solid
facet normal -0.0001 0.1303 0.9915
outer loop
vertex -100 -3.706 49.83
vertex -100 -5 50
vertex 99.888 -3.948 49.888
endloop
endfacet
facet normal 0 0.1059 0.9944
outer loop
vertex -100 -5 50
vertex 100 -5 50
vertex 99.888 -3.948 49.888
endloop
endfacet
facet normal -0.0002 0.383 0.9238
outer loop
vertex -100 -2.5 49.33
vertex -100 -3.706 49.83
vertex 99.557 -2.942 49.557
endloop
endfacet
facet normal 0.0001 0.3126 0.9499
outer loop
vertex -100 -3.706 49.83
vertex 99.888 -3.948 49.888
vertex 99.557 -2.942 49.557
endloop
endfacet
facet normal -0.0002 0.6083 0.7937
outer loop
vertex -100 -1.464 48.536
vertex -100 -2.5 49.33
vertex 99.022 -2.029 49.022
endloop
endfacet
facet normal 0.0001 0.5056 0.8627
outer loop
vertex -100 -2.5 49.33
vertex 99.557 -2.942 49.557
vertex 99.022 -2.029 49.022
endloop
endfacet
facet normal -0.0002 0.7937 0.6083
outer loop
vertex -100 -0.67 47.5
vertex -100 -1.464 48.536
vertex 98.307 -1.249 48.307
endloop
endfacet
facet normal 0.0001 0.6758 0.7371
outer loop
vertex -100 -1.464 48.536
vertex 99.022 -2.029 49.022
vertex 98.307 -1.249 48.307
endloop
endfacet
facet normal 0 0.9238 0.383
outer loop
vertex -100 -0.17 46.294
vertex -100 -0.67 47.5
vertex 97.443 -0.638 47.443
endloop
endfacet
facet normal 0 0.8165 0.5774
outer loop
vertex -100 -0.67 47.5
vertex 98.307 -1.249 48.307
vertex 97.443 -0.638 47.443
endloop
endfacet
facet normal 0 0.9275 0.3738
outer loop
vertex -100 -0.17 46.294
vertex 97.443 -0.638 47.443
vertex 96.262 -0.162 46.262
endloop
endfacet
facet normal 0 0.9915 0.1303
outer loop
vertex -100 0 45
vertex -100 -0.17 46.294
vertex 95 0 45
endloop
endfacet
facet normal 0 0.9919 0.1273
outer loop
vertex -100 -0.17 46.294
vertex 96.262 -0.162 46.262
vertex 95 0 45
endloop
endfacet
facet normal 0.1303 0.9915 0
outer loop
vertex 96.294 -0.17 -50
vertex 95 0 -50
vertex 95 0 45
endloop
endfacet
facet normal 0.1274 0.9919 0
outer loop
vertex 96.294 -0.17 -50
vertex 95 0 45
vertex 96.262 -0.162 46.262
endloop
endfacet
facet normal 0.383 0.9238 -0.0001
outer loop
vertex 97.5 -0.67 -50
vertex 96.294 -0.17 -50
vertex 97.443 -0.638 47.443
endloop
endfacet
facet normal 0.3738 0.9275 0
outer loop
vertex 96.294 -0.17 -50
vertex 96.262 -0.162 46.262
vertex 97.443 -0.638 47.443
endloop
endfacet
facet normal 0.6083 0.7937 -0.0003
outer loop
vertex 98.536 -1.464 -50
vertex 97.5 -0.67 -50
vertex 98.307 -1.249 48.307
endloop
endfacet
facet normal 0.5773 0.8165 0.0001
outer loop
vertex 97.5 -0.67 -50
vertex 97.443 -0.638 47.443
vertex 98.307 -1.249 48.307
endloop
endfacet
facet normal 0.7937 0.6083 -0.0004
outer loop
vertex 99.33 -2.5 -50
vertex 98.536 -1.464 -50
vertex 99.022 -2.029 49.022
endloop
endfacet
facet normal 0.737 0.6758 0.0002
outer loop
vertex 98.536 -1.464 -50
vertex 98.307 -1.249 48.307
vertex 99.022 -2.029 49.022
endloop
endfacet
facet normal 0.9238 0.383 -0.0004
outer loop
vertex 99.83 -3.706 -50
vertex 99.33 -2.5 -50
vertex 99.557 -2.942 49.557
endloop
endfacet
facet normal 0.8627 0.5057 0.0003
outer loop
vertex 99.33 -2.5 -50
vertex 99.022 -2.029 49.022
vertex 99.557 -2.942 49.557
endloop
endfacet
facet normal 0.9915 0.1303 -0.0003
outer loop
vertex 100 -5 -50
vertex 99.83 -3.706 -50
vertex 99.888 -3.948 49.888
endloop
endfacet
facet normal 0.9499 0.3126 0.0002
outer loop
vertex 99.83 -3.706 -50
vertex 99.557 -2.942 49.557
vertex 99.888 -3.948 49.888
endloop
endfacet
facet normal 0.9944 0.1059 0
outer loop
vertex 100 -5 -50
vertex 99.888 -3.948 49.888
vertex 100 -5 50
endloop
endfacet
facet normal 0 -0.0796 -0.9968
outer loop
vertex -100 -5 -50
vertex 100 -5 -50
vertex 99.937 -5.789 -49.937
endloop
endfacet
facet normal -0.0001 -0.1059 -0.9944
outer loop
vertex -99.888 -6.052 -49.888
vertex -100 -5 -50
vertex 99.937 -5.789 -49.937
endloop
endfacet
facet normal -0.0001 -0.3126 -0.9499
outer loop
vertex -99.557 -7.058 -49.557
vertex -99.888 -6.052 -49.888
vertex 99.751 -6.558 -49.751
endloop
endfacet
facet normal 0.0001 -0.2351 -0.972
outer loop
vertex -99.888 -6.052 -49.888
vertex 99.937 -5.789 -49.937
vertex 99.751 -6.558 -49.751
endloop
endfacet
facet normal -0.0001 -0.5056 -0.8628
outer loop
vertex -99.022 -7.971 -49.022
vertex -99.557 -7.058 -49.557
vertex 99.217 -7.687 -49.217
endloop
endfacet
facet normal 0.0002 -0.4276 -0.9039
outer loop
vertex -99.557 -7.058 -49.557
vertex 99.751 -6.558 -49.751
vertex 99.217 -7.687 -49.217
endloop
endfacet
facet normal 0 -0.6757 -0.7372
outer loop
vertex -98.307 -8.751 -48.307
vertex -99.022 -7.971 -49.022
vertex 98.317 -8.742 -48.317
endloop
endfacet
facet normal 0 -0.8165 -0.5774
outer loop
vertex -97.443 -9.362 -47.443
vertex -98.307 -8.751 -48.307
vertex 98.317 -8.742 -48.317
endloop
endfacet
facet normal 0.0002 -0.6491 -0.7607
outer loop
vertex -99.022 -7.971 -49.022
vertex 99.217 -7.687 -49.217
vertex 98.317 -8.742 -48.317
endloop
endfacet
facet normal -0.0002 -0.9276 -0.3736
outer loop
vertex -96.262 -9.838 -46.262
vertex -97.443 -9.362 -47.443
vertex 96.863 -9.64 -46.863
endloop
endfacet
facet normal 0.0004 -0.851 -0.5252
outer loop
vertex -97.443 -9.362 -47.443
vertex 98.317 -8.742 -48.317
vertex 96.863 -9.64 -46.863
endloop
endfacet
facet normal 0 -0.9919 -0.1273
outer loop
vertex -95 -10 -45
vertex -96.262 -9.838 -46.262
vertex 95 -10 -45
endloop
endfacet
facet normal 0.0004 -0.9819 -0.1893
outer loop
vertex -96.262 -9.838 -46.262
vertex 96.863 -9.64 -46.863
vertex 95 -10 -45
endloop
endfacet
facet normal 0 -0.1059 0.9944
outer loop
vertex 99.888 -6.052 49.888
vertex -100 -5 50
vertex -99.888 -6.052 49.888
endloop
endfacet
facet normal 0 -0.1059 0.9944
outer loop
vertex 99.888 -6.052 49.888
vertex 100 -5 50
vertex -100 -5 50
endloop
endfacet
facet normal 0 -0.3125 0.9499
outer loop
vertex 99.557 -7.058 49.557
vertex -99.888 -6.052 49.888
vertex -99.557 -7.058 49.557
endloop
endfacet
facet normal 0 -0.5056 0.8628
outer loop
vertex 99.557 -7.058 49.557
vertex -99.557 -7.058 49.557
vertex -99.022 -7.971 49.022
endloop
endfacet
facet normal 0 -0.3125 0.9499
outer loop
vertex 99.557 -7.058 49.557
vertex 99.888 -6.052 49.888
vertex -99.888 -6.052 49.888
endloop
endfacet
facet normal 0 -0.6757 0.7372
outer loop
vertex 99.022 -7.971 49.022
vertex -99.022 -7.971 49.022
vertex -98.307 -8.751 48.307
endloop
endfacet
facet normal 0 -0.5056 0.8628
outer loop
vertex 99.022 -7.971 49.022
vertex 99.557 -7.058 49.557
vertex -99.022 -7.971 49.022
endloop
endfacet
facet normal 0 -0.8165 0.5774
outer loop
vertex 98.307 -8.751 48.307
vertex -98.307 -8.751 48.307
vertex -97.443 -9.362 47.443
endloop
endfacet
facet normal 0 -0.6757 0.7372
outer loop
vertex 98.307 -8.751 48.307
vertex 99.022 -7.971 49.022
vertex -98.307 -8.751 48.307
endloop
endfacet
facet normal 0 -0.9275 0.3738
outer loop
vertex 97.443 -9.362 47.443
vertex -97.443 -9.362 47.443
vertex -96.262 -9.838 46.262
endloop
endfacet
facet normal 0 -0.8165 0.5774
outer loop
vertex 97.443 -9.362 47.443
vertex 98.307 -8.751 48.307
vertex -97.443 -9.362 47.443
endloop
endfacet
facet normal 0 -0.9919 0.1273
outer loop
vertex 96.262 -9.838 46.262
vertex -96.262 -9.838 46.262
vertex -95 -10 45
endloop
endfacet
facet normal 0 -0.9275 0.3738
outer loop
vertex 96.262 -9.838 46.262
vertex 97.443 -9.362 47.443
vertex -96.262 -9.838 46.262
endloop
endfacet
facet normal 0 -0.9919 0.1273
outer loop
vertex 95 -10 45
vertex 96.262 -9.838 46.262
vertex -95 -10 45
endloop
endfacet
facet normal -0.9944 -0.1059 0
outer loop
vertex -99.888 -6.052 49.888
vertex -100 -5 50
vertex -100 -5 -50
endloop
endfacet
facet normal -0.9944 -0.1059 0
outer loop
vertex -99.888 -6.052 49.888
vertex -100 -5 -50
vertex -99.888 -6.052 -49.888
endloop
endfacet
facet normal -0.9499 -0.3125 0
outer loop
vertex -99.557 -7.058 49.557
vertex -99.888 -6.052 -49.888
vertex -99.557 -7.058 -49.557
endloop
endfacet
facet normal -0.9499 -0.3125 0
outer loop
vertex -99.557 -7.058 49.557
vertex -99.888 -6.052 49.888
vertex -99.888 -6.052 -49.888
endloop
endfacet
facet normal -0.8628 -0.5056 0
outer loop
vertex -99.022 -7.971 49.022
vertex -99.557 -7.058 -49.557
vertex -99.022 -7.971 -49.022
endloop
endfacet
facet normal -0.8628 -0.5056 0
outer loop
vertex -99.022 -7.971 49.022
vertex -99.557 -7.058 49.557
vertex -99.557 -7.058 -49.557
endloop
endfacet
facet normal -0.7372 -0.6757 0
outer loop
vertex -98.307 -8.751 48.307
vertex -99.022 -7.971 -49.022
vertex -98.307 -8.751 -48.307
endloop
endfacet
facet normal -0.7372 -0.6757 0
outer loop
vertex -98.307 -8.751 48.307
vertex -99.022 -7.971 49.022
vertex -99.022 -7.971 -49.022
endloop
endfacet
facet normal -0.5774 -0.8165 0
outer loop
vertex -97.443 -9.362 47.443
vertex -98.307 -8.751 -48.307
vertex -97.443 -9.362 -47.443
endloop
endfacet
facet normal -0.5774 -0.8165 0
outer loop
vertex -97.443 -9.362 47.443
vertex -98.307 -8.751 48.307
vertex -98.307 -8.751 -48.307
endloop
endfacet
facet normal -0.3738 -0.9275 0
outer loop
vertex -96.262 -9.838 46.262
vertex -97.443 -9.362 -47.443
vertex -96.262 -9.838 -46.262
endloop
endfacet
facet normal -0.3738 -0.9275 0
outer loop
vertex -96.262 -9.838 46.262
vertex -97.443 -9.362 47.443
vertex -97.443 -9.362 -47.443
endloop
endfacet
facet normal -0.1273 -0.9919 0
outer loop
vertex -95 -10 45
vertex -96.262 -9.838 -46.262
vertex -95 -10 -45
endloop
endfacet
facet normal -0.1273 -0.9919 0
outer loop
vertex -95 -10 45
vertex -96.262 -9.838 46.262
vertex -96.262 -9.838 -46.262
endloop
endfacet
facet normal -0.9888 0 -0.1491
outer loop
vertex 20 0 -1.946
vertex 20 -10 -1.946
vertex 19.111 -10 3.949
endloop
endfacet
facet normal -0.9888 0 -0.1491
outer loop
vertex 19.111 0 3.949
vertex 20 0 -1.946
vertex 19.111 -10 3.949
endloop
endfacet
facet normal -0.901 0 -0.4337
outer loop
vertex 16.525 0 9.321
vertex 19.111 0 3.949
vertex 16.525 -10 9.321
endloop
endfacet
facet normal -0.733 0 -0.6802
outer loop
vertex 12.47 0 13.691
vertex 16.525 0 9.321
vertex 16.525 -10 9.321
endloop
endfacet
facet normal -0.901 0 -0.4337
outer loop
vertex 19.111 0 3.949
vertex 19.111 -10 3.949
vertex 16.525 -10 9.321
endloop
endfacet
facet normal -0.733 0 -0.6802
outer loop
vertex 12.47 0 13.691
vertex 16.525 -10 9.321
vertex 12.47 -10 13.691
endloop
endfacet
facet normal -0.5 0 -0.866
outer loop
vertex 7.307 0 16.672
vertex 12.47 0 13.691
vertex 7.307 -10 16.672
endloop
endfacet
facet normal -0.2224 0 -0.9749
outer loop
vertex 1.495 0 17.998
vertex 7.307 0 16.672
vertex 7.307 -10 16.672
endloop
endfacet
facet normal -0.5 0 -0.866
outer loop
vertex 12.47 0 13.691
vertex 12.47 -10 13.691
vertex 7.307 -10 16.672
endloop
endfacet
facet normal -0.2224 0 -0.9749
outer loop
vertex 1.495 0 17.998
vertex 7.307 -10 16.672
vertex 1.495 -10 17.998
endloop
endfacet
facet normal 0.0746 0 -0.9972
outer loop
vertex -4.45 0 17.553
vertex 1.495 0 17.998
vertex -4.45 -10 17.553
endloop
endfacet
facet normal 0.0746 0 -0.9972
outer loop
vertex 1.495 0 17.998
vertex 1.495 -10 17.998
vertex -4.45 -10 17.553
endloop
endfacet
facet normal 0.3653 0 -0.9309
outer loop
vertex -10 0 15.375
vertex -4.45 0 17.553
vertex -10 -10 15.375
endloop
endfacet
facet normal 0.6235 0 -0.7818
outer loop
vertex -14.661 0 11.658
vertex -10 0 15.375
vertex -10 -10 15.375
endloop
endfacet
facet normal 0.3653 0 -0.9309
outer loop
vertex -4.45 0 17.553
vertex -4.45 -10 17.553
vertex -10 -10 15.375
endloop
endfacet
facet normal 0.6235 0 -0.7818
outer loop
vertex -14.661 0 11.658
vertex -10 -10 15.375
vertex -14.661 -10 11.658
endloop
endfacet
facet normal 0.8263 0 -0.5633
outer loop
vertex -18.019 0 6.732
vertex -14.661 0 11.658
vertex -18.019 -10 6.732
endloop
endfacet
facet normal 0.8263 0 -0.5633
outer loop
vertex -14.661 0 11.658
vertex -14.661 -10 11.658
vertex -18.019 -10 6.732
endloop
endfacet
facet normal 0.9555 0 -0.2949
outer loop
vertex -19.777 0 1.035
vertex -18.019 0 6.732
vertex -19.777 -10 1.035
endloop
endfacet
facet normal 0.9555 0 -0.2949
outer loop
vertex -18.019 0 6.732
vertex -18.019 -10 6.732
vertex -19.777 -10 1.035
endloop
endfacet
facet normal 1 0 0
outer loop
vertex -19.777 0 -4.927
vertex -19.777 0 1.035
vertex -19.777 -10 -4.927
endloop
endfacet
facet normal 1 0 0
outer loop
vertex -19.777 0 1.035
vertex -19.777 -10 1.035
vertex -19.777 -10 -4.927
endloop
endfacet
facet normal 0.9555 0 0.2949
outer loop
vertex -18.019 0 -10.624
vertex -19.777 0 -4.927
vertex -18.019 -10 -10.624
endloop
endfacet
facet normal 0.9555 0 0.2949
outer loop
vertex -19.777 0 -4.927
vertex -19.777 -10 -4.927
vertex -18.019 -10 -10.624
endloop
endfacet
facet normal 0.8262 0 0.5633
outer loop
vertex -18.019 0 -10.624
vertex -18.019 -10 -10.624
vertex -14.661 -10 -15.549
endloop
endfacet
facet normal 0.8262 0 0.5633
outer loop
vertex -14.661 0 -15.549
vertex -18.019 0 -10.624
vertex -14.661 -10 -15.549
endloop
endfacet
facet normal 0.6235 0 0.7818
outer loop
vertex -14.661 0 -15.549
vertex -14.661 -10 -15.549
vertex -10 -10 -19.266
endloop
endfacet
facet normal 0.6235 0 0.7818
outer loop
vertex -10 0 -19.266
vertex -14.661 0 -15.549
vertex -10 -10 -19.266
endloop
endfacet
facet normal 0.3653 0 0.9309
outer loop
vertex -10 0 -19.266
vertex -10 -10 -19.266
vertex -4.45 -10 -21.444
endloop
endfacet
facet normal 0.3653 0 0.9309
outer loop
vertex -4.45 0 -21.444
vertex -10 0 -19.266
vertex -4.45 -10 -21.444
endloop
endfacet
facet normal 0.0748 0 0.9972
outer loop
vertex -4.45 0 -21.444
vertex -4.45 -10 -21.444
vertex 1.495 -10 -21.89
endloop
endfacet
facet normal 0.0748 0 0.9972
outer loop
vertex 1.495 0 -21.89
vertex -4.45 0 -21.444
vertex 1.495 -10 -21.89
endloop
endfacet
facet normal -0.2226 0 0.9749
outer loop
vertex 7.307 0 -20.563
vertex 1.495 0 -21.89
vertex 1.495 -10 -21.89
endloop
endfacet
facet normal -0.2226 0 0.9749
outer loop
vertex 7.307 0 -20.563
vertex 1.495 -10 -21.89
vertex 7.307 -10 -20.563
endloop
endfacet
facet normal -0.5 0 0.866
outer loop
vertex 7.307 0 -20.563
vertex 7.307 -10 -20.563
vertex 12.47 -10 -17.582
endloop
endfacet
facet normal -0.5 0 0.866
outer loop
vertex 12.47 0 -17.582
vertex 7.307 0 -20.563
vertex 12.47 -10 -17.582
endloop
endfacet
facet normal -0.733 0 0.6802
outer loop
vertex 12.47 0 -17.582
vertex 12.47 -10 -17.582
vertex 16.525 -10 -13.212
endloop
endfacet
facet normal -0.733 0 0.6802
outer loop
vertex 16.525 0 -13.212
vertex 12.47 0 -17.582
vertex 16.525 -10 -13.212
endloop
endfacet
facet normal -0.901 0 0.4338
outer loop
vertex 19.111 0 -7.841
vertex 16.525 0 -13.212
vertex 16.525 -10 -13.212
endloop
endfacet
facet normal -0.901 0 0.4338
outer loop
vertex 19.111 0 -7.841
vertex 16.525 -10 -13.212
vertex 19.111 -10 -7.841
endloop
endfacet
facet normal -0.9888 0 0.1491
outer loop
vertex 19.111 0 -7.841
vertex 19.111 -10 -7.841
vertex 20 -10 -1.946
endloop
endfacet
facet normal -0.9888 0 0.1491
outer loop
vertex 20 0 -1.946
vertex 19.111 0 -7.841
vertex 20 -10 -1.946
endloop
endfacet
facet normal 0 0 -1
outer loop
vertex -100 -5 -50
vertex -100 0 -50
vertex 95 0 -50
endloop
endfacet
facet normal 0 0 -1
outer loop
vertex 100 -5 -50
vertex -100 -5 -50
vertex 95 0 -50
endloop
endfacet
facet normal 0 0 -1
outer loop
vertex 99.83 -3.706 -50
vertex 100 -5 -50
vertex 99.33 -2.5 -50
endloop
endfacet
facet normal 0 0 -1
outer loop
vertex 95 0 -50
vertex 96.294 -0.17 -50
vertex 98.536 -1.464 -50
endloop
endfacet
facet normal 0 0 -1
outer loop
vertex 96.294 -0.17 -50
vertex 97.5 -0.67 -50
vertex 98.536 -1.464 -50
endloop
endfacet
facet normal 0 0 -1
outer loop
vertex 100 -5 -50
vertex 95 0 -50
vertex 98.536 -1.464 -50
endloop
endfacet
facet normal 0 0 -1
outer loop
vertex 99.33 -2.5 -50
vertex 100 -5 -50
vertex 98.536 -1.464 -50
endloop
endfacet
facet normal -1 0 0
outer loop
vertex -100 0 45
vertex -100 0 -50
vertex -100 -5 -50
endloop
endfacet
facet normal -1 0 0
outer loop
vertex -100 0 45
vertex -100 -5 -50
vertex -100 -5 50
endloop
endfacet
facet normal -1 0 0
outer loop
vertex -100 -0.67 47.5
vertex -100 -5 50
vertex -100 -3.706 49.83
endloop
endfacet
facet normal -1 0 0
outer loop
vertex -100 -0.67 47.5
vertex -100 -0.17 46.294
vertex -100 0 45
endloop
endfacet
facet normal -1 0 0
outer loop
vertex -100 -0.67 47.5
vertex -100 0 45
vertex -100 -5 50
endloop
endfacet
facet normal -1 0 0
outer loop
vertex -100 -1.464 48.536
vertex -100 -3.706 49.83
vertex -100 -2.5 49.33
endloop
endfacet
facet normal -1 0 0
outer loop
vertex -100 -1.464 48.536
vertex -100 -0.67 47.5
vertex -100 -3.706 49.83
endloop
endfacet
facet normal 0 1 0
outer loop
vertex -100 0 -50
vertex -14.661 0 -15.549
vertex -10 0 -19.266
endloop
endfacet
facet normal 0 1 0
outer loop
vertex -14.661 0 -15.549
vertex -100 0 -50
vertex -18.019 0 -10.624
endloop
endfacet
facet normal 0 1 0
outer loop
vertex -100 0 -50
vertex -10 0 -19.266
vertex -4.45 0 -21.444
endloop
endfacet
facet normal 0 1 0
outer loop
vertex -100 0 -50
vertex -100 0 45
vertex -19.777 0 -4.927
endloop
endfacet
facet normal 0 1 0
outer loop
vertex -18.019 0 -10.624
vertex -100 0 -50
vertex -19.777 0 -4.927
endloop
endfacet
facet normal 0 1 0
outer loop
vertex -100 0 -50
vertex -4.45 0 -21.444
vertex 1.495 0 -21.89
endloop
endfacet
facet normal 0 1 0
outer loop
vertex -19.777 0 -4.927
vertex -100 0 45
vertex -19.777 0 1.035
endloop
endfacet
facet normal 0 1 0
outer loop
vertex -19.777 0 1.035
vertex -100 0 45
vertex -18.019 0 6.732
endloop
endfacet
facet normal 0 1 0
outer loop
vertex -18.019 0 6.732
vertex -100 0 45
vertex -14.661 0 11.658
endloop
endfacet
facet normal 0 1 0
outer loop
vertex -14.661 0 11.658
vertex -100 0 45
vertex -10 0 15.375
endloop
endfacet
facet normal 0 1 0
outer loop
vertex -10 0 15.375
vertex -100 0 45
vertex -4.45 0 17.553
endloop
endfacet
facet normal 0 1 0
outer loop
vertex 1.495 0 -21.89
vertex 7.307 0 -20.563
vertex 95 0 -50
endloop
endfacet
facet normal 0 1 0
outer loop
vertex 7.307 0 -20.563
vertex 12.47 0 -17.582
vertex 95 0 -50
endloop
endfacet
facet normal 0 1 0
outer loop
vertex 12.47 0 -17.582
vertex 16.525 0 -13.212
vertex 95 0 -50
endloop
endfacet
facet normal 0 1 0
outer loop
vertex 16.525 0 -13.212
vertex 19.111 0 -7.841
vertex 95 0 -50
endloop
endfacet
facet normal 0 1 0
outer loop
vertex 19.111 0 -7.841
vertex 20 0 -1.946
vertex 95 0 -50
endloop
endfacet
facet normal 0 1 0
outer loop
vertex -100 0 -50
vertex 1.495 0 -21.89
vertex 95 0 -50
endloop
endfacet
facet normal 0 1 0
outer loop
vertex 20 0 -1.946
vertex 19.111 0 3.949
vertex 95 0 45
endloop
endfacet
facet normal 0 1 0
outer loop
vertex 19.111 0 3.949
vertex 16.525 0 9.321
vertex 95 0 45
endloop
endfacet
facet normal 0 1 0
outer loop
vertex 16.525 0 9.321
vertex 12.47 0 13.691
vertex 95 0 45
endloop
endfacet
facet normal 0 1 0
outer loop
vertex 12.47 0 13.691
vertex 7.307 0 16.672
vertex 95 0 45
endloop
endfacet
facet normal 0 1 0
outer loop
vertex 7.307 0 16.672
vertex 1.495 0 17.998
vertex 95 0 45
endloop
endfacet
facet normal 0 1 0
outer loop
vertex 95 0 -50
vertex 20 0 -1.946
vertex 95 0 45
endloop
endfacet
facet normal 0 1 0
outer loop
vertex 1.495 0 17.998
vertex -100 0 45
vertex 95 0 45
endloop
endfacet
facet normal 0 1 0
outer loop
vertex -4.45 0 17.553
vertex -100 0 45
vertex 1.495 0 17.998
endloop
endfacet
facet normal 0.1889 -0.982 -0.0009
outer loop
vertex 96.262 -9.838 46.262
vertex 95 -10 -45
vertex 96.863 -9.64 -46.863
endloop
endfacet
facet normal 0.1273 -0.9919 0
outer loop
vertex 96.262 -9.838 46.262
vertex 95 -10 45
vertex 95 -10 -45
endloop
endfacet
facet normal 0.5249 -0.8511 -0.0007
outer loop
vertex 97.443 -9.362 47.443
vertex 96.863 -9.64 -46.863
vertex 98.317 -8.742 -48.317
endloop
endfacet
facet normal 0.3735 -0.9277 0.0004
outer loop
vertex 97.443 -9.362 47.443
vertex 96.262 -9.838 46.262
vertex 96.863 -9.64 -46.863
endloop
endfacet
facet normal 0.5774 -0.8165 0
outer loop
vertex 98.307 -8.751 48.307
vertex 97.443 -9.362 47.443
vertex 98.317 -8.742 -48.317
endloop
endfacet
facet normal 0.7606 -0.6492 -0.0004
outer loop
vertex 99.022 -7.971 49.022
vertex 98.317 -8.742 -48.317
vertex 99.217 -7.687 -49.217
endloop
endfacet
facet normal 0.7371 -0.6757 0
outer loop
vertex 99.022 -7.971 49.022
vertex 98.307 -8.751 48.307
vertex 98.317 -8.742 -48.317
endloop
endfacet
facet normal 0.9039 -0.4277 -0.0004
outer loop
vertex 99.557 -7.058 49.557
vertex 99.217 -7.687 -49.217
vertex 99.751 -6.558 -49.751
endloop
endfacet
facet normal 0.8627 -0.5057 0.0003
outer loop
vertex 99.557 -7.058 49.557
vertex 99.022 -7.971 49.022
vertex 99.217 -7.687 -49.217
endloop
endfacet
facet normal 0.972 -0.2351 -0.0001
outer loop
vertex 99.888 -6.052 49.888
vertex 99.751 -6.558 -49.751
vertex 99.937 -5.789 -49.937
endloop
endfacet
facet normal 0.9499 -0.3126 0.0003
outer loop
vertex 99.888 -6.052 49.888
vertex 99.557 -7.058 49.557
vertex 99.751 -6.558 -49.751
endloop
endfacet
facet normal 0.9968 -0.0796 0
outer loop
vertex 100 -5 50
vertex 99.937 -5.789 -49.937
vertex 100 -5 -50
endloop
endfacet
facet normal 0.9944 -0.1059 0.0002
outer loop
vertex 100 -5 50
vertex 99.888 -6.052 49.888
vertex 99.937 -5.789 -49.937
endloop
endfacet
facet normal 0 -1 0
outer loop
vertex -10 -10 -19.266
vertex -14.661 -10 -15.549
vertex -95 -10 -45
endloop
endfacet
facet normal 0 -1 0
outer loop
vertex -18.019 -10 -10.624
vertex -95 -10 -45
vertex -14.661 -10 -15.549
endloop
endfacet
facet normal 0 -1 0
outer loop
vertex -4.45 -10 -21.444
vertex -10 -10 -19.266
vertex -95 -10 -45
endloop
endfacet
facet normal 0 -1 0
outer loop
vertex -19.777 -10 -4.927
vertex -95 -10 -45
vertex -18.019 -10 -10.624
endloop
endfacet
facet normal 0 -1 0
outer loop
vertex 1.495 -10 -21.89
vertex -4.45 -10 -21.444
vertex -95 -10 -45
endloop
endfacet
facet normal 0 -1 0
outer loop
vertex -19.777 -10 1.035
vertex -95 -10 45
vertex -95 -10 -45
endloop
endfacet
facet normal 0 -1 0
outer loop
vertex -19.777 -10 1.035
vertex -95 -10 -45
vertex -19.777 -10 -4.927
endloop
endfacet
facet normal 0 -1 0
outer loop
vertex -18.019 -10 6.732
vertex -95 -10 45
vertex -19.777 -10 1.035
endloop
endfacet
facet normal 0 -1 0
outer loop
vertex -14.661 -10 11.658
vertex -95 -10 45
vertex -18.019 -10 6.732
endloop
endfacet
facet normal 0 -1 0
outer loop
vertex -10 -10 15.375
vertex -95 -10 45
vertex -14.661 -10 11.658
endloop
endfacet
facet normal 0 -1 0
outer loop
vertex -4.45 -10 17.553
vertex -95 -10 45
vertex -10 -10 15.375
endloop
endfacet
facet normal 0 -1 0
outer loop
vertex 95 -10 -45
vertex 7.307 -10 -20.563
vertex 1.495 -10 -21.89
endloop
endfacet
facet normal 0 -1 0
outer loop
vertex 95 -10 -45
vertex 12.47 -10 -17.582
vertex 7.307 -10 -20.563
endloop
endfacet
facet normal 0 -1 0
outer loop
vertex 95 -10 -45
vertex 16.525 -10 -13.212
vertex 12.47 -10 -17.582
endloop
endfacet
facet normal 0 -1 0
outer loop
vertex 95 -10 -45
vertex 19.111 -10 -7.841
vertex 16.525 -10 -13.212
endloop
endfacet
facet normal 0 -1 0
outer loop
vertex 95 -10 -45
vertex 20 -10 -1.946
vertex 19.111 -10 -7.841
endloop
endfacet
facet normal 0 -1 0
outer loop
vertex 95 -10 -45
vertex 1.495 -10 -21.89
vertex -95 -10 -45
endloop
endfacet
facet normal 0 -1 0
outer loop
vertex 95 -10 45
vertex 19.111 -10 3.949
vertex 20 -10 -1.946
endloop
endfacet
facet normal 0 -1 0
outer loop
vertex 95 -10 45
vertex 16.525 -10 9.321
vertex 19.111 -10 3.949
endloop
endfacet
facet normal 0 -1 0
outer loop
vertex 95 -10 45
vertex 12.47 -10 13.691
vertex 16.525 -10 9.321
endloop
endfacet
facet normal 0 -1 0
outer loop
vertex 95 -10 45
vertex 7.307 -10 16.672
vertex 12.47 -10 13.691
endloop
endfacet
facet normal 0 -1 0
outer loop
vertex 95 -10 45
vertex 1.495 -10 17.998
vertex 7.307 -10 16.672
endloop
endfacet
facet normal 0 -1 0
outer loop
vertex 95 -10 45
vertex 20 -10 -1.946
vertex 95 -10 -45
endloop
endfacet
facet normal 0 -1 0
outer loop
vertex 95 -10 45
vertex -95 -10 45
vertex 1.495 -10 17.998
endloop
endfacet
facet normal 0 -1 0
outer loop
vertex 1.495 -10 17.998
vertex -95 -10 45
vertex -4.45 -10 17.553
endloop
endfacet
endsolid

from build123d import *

# Parameters (mm, degrees)
F0_W     = 200
F0_H     = 100
F1_DEPTH = 10
F2_R     = 20
F3_DEPTH = 10.001
F4_R     = 4.99999


# Not quite as in the source:
# - a fillet or chamfer is up to 0.001 mm smaller than in the source, because OpenCascade refuses the exact size


with BuildPart() as f1:
    # F0 (on Front) → F1 (new body)
    with BuildSketch(Plane.XZ):
        Rectangle(F0_W, F0_H)
    extrude(amount=F1_DEPTH)

    # F2 (on face) → F3 (cut, through all)
    with BuildSketch(Plane.XZ.offset(10)):
        with Locations((0, -1.9458576571)):
            Circle(F2_R)
    extrude(amount=-F3_DEPTH, mode=Mode.SUBTRACT)

    # F4 (radius 5 in the source; OpenCascade refuses exactly that, so slightly less here)
    f4_edges = [f1.edges().sort_by_distance(p)[0] for p in [
        (0, -10, 50),
        (0, 0, 50),
        (100, 0, 0),
        (100, -10, 0),
        (0, -10, -50),
        (-100, -10, 0),
    ]]
    fillet(f4_edges, radius=F4_R)


solid = f1.part
